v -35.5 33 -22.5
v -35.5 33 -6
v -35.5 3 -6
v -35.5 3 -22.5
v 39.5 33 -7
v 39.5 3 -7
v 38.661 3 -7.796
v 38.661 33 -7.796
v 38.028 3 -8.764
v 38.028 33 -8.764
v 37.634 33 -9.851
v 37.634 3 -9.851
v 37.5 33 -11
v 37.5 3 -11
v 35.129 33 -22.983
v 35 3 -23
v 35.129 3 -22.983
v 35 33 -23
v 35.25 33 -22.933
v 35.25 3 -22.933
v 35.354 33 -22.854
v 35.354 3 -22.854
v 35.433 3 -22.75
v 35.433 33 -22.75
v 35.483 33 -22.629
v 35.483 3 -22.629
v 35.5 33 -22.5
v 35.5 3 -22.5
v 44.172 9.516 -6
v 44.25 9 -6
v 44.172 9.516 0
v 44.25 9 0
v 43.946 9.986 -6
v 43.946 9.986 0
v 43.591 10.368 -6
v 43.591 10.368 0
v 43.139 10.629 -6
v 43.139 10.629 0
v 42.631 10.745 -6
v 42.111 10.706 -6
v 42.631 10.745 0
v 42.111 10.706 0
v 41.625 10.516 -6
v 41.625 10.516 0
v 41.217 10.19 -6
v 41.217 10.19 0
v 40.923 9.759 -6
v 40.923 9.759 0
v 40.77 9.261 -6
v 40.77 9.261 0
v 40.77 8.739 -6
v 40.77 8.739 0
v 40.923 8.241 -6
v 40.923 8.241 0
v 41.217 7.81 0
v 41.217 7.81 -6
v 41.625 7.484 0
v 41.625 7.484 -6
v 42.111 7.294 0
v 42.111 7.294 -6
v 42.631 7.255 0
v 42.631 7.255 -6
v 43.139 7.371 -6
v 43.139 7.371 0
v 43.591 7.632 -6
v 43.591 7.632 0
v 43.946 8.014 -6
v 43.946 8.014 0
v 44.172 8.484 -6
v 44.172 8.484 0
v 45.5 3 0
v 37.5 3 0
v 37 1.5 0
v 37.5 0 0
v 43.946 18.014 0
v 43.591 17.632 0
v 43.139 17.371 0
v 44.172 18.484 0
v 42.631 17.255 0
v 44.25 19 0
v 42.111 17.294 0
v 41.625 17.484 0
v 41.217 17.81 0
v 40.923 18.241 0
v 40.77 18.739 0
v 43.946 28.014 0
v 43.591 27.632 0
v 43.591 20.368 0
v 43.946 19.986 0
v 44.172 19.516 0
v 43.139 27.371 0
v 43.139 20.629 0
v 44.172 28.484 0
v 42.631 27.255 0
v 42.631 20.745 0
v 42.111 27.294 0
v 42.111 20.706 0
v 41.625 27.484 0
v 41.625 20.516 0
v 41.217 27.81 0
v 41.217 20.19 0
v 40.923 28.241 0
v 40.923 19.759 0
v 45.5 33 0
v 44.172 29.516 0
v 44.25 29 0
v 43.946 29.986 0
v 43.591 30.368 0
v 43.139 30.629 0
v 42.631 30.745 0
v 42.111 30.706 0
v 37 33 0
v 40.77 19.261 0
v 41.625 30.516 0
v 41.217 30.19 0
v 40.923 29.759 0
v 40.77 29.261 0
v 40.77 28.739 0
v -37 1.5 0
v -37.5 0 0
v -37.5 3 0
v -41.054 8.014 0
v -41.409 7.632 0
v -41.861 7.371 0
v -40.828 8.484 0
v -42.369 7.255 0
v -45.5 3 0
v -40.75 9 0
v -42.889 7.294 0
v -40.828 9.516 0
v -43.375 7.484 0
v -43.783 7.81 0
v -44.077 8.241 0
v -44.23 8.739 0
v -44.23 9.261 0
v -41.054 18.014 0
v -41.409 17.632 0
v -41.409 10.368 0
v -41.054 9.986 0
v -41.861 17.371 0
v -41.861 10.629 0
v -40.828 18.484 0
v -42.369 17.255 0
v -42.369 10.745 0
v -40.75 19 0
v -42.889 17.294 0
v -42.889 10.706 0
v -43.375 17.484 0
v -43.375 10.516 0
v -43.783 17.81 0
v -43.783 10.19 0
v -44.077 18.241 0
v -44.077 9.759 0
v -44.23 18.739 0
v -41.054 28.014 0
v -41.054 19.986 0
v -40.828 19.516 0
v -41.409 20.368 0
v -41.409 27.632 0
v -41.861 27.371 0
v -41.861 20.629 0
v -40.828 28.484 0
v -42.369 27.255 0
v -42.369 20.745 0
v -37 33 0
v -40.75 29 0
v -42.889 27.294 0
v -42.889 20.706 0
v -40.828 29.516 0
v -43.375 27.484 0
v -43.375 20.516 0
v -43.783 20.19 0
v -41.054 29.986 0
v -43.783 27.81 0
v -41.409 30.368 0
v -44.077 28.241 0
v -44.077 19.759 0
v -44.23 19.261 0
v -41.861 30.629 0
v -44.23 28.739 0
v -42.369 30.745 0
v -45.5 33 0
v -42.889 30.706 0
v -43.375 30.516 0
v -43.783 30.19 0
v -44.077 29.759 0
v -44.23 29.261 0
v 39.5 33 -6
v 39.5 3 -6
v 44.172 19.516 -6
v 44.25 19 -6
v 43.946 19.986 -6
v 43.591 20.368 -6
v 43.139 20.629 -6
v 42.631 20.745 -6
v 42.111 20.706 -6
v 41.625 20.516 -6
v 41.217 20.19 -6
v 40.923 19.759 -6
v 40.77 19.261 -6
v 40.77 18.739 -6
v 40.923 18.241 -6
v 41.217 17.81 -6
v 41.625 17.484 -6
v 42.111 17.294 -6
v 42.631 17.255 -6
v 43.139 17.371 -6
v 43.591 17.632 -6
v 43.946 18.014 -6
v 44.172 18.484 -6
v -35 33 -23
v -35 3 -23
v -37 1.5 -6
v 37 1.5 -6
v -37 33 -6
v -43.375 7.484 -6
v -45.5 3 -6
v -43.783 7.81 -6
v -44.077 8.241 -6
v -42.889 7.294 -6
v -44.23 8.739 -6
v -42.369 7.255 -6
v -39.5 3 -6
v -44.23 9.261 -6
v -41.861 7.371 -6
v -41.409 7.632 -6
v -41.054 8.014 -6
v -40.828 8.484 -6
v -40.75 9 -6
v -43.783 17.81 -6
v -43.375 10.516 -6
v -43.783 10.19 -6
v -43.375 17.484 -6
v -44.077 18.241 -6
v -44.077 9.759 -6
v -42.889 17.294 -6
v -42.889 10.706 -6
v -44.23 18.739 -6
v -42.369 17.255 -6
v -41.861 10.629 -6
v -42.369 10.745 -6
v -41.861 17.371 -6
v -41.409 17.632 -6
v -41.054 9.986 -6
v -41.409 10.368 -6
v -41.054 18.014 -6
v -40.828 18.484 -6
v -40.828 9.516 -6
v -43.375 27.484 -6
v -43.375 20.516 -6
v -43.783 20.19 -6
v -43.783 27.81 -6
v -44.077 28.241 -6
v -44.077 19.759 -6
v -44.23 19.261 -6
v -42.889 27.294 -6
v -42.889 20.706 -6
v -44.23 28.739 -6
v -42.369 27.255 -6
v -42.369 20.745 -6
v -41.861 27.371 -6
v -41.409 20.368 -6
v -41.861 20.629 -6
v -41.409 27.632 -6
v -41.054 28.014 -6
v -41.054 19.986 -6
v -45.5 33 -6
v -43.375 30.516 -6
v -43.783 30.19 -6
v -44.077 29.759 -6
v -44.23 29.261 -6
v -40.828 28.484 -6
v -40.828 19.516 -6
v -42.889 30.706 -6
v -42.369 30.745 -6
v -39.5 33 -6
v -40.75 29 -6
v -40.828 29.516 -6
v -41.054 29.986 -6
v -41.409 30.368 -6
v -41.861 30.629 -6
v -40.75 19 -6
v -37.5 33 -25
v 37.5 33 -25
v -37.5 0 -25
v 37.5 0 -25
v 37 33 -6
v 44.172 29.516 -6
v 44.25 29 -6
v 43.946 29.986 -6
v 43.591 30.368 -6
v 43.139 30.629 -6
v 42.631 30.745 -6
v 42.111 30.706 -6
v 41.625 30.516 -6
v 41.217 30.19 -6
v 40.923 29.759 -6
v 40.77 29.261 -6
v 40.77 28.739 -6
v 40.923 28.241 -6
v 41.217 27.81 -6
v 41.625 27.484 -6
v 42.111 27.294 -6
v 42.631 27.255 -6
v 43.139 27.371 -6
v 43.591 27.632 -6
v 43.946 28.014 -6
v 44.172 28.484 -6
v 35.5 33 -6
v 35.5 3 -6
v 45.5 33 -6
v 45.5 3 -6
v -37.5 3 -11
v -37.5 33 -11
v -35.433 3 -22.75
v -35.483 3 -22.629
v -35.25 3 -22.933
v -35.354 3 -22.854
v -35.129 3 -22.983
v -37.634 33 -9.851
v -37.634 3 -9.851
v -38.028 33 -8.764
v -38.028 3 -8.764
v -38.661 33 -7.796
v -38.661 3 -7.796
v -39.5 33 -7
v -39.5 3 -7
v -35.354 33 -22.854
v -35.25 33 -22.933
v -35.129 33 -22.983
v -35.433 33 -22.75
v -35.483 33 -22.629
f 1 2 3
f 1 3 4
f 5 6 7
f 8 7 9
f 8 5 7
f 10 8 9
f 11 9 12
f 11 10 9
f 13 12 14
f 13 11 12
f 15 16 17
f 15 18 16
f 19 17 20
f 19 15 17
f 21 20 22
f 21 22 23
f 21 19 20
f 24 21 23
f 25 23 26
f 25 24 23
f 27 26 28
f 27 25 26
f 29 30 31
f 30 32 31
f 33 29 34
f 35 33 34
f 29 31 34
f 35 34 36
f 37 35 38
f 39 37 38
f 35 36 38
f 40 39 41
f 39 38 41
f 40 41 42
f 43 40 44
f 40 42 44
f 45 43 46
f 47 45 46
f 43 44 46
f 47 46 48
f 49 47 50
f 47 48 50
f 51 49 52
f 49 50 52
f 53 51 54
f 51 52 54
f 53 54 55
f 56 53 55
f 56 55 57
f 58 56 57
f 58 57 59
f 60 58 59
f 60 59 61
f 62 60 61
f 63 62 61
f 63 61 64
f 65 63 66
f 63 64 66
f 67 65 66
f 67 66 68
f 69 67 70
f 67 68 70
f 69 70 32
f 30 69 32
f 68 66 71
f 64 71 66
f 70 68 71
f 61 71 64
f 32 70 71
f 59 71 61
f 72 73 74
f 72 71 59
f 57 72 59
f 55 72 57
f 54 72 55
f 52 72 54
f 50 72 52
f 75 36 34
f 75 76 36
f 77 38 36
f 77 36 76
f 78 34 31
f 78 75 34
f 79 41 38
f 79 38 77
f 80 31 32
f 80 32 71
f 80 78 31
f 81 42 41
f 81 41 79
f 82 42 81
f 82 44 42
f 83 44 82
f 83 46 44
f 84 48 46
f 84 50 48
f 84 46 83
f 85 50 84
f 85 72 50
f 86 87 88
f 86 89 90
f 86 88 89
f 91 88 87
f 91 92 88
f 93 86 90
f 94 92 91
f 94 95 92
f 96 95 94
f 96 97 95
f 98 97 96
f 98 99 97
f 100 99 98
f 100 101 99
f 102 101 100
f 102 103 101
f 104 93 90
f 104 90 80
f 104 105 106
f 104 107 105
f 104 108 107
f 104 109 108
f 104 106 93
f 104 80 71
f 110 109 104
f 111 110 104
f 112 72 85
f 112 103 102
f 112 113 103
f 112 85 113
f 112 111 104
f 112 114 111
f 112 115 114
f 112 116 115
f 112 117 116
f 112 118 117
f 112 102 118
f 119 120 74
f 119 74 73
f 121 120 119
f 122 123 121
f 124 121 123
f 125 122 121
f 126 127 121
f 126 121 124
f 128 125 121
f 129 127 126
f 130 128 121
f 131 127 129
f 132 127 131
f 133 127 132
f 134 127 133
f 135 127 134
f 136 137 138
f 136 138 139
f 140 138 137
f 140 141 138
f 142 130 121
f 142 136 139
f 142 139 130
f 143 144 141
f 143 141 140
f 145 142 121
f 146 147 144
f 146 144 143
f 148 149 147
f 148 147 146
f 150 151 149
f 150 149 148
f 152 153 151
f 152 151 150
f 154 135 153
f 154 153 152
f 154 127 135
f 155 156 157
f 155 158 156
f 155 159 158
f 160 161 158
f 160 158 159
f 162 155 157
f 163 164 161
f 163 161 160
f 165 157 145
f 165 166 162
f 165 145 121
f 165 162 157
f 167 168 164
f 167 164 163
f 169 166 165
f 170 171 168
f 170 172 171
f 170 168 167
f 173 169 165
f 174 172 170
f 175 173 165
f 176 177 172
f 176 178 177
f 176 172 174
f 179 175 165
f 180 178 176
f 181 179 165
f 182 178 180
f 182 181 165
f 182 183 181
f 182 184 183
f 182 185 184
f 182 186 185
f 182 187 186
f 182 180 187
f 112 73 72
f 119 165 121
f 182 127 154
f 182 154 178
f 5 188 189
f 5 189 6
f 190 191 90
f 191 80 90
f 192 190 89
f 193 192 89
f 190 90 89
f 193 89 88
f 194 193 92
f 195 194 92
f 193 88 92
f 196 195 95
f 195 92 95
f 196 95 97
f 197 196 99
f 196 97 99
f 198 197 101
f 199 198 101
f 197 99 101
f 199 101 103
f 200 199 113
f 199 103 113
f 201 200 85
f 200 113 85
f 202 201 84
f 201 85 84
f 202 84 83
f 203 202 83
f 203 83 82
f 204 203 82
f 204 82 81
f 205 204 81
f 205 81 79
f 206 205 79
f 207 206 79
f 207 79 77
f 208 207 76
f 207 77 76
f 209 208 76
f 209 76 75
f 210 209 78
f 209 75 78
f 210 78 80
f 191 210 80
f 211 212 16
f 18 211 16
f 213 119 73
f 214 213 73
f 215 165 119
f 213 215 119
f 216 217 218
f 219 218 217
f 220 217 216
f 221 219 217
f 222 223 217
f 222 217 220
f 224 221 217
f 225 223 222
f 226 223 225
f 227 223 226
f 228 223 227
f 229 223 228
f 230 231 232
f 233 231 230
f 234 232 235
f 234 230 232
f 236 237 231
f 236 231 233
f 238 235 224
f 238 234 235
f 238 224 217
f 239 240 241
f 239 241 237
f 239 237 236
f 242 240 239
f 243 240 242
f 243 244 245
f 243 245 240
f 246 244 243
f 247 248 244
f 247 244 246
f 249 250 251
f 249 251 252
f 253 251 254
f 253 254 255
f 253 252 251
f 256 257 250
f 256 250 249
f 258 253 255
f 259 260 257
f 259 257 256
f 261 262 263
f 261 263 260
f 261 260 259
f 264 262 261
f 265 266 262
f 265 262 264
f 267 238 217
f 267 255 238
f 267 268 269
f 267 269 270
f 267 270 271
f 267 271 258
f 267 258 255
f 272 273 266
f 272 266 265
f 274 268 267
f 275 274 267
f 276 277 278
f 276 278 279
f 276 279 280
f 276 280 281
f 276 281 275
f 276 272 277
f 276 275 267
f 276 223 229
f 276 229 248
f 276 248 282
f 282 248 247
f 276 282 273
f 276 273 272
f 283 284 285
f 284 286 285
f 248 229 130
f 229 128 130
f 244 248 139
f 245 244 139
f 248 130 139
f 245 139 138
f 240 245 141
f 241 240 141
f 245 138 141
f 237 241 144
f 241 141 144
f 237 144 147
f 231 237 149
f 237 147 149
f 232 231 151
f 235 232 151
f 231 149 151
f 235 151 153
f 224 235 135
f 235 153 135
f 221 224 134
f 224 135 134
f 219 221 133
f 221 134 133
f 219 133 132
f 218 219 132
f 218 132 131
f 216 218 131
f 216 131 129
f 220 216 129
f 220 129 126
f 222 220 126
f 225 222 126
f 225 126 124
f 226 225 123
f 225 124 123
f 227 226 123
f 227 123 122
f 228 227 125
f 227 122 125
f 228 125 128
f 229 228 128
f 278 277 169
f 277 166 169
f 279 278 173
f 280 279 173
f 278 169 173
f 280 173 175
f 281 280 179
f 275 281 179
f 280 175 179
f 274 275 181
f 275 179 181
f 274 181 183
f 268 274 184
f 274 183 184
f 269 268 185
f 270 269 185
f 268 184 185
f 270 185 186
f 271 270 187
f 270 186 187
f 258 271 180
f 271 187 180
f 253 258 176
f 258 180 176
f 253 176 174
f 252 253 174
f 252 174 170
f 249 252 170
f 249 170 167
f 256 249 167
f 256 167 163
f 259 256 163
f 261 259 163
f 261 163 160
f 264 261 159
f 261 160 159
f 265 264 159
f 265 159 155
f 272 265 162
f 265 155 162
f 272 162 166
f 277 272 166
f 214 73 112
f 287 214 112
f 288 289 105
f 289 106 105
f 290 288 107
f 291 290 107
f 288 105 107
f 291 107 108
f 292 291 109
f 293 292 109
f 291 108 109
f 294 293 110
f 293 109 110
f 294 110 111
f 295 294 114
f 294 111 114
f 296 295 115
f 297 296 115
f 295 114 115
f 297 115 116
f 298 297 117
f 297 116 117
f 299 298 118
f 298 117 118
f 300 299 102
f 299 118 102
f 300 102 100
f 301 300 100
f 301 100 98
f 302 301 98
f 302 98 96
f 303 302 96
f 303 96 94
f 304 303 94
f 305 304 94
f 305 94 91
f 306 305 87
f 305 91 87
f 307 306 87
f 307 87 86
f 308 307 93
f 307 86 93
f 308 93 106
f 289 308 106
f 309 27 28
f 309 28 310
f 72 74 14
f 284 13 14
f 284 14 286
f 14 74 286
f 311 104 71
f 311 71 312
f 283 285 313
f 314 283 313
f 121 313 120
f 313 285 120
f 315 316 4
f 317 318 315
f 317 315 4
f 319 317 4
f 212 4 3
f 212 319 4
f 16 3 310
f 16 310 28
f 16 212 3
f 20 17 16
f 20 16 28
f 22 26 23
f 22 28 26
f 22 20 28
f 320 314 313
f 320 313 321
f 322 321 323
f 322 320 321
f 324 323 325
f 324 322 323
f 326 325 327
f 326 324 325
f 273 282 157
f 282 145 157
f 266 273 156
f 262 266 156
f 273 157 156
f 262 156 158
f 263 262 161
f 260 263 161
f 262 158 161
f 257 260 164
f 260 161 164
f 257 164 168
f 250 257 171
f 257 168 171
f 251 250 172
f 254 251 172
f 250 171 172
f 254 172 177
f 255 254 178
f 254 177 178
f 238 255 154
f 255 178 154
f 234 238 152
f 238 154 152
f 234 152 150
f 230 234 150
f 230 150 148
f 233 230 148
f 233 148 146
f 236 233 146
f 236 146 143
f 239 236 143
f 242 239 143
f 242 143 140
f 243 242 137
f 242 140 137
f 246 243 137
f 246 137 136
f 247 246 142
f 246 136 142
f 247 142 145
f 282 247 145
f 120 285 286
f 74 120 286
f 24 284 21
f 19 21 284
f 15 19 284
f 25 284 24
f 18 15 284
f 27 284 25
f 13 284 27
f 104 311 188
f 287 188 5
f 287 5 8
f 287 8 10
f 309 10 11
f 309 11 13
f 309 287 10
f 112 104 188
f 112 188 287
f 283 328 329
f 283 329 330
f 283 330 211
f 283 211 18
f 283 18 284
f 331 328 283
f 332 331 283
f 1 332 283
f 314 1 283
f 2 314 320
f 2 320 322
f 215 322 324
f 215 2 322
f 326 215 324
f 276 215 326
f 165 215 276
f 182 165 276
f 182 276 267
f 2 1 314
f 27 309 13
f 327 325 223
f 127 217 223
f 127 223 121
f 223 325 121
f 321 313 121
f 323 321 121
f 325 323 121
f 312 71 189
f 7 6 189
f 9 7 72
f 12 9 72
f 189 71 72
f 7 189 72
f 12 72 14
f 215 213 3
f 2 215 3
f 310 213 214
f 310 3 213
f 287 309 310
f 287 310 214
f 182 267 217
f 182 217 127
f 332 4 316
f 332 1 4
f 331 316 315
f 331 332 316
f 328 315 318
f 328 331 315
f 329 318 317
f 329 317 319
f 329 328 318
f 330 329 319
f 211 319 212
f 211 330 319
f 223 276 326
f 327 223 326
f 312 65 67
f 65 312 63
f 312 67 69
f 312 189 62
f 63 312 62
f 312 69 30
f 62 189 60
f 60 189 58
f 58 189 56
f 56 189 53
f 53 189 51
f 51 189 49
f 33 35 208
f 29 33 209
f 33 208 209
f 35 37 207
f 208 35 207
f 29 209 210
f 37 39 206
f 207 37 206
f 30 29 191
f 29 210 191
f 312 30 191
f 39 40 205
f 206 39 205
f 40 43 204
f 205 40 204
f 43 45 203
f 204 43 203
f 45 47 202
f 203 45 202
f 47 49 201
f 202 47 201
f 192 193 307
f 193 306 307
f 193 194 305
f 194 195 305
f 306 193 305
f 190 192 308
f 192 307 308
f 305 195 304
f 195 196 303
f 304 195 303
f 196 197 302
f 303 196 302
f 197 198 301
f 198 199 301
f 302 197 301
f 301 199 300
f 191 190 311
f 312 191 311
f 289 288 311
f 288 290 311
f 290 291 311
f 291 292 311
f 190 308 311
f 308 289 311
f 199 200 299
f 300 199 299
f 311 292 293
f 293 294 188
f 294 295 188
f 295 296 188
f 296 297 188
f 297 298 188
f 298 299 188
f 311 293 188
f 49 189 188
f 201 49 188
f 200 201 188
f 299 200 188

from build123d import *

# Parameters (mm, degrees)
SKETCH2_W           = 75
SKETCH2_H           = 25
BOSS_EXTRUDE1_DEPTH = 3
BOSS_EXTRUDE2_DEPTH = 30
SKETCH5_W           = 6
SKETCH5_H           = 30
BOSS_EXTRUDE3_DEPTH = 8
SKETCH6_W           = 6
SKETCH6_H           = 30
BOSS_EXTRUDE4_DEPTH = 8
SKETCH8_R           = 1.75
CUT_EXTRUDE1_DEPTH  = 8
CUT_EXTRUDE2_DEPTH  = 6
FILLET1_R           = 5
FILLET2_R           = 5
SKETCH13_W          = 6
SKETCH13_H          = 2
CUT_EXTRUDE3_DEPTH  = 36
FILLET3_R           = 0.5


with BuildPart() as part:
    # Sketch2 → Boss-Extrude1 (new body)
    with BuildSketch(Plane(origin=(0, 0, 0), x_dir=(1, 0, 0), z_dir=(0, 1, 0))):
        with Locations((0, 12.5)):
            Rectangle(SKETCH2_W, SKETCH2_H)
    extrude(amount=BOSS_EXTRUDE1_DEPTH)

    # Sketch3 → Boss-Extrude2 (add)
    with BuildSketch(Plane(origin=(0, 3, 0), x_dir=(1, 0, 0), z_dir=(0, 1, 0))):
        Polygon((-35.5, 0), (-35.5, 23), (35.5, 23), (35.5, 0), (37.5, 0), (37.5, 25), (-37.5, 25), (-37.5, 0), align=None)
    extrude(amount=BOSS_EXTRUDE2_DEPTH)

    # Sketch5 → Boss-Extrude3 (add)
    with BuildSketch(Plane.ZY.offset(37.5)):
        with Locations((-3, 18)):
            Rectangle(SKETCH5_W, SKETCH5_H)
    extrude(amount=BOSS_EXTRUDE3_DEPTH)

    # Sketch6 → Boss-Extrude4 (add)
    with BuildSketch(Plane(origin=(37.5, 0, 0), x_dir=(0, 0, -1), z_dir=(1, 0, 0))):
        with Locations((3, 18)):
            Rectangle(SKETCH6_W, SKETCH6_H)
    extrude(amount=BOSS_EXTRUDE4_DEPTH)

    # Sketch8 → Cut-Extrude1 (cut)
    with BuildSketch(Plane.XY):
        with Locations((-42.5, 29)):
            Circle(SKETCH8_R)
        with Locations((42.5, 29)):
            Circle(SKETCH8_R)
        with Locations((-42.5, 19)):
            Circle(SKETCH8_R)
        with Locations((-42.5, 9)):
            Circle(SKETCH8_R)
        with Locations((42.5, 19)):
            Circle(SKETCH8_R)
        with Locations((42.5, 9)):
            Circle(SKETCH8_R)
    extrude(amount=-CUT_EXTRUDE1_DEPTH, mode=Mode.SUBTRACT)

    # Sketch12 → Cut-Extrude2 (cut)
    with BuildSketch(Plane.XY):
        Polygon((-35.5, 33), (-37, 33), (-37, 1.5), (37, 1.5), (37, 33), (35.5, 33), (35.5, 3), (-35.5, 3), align=None)
    extrude(amount=-CUT_EXTRUDE2_DEPTH, mode=Mode.SUBTRACT)

    # Fillet1
    # the kernel refuses this fillet: 5 mm, written as the material it adds along each edge
    with BuildSketch(Plane(origin=(-37.5, 33, -6), x_dir=(0, 0, -1), z_dir=(0, -1, 0))) as fillet1_piece_1_section:
        with BuildLine():
            CenterArc((FILLET1_R, -FILLET1_R), FILLET1_R, 90, 90)
            Line((0, -FILLET1_R), (0, 0))
            Line((0, 0), (FILLET1_R, 0))
        make_face()
    fillet1_piece_1 = extrude(amount=30, mode=Mode.PRIVATE)
    fillet1_piece_1 = fillet1_piece_1 - Plane(origin=(-42.5, 29, -7.147283254), x_dir=(1, 0, 0), z_dir=(0, 0, 1)) * Cylinder(1.75, 80, mode=Mode.PRIVATE)
    fillet1_piece_1 = fillet1_piece_1 - Plane(origin=(-42.5, 19, -7.147283254), x_dir=(1, 0, 0), z_dir=(0, 0, 1)) * Cylinder(1.75, 80, mode=Mode.PRIVATE)
    fillet1_piece_1 = fillet1_piece_1 - Plane(origin=(-42.5, 9, -7.147283254), x_dir=(1, 0, 0), z_dir=(0, 0, 1)) * Cylinder(1.75, 80, mode=Mode.PRIVATE)
    add(fillet1_piece_1)

    # Fillet2
    # the kernel refuses this fillet: 5 mm, written as the material it adds along each edge
    with BuildSketch(Plane(origin=(37.5, 33, -6), x_dir=(1, 0, 0), z_dir=(0, -1, 0))) as fillet2_piece_1_section:
        with BuildLine():
            CenterArc((FILLET2_R, -FILLET2_R), FILLET2_R, 90, 90)
            Line((0, -FILLET2_R), (0, 0))
            Line((0, 0), (FILLET2_R, 0))
        make_face()
    fillet2_piece_1 = extrude(amount=30, mode=Mode.PRIVATE)
    fillet2_piece_1 = fillet2_piece_1 - Plane(origin=(42.5, 9, -7.147283906), x_dir=(1, 0, 0), z_dir=(0, 0, 1)) * Cylinder(1.75, 80, mode=Mode.PRIVATE)
    fillet2_piece_1 = fillet2_piece_1 - Plane(origin=(42.5, 29, -7.147283906), x_dir=(1, 0, 0), z_dir=(0, 0, 1)) * Cylinder(1.75, 80, mode=Mode.PRIVATE)
    fillet2_piece_1 = fillet2_piece_1 - Plane(origin=(42.5, 19, -7.147283906), x_dir=(1, 0, 0), z_dir=(0, 0, 1)) * Cylinder(1.75, 80, mode=Mode.PRIVATE)
    add(fillet2_piece_1)

    # Sketch13 → Cut-Extrude3 (cut)
    with BuildSketch(Plane(origin=(0, 33, 0), x_dir=(1, 0, 0), z_dir=(0, 1, 0))):
        with Locations((-42.5, 7)):
            Rectangle(SKETCH13_W, SKETCH13_H)
        with Locations((42.5, 7)):
            Rectangle(SKETCH13_W, SKETCH13_H)
    extrude(amount=-CUT_EXTRUDE3_DEPTH, mode=Mode.SUBTRACT)

    # Fillet3
    fillet3_edges = [part.edges().sort_by_distance(p)[0] for p in [
        (-35.5, 18, -23),
        (35.5, 18, -23),
    ]]
    fillet(fillet3_edges, radius=FILLET3_R)


solid = part.part
